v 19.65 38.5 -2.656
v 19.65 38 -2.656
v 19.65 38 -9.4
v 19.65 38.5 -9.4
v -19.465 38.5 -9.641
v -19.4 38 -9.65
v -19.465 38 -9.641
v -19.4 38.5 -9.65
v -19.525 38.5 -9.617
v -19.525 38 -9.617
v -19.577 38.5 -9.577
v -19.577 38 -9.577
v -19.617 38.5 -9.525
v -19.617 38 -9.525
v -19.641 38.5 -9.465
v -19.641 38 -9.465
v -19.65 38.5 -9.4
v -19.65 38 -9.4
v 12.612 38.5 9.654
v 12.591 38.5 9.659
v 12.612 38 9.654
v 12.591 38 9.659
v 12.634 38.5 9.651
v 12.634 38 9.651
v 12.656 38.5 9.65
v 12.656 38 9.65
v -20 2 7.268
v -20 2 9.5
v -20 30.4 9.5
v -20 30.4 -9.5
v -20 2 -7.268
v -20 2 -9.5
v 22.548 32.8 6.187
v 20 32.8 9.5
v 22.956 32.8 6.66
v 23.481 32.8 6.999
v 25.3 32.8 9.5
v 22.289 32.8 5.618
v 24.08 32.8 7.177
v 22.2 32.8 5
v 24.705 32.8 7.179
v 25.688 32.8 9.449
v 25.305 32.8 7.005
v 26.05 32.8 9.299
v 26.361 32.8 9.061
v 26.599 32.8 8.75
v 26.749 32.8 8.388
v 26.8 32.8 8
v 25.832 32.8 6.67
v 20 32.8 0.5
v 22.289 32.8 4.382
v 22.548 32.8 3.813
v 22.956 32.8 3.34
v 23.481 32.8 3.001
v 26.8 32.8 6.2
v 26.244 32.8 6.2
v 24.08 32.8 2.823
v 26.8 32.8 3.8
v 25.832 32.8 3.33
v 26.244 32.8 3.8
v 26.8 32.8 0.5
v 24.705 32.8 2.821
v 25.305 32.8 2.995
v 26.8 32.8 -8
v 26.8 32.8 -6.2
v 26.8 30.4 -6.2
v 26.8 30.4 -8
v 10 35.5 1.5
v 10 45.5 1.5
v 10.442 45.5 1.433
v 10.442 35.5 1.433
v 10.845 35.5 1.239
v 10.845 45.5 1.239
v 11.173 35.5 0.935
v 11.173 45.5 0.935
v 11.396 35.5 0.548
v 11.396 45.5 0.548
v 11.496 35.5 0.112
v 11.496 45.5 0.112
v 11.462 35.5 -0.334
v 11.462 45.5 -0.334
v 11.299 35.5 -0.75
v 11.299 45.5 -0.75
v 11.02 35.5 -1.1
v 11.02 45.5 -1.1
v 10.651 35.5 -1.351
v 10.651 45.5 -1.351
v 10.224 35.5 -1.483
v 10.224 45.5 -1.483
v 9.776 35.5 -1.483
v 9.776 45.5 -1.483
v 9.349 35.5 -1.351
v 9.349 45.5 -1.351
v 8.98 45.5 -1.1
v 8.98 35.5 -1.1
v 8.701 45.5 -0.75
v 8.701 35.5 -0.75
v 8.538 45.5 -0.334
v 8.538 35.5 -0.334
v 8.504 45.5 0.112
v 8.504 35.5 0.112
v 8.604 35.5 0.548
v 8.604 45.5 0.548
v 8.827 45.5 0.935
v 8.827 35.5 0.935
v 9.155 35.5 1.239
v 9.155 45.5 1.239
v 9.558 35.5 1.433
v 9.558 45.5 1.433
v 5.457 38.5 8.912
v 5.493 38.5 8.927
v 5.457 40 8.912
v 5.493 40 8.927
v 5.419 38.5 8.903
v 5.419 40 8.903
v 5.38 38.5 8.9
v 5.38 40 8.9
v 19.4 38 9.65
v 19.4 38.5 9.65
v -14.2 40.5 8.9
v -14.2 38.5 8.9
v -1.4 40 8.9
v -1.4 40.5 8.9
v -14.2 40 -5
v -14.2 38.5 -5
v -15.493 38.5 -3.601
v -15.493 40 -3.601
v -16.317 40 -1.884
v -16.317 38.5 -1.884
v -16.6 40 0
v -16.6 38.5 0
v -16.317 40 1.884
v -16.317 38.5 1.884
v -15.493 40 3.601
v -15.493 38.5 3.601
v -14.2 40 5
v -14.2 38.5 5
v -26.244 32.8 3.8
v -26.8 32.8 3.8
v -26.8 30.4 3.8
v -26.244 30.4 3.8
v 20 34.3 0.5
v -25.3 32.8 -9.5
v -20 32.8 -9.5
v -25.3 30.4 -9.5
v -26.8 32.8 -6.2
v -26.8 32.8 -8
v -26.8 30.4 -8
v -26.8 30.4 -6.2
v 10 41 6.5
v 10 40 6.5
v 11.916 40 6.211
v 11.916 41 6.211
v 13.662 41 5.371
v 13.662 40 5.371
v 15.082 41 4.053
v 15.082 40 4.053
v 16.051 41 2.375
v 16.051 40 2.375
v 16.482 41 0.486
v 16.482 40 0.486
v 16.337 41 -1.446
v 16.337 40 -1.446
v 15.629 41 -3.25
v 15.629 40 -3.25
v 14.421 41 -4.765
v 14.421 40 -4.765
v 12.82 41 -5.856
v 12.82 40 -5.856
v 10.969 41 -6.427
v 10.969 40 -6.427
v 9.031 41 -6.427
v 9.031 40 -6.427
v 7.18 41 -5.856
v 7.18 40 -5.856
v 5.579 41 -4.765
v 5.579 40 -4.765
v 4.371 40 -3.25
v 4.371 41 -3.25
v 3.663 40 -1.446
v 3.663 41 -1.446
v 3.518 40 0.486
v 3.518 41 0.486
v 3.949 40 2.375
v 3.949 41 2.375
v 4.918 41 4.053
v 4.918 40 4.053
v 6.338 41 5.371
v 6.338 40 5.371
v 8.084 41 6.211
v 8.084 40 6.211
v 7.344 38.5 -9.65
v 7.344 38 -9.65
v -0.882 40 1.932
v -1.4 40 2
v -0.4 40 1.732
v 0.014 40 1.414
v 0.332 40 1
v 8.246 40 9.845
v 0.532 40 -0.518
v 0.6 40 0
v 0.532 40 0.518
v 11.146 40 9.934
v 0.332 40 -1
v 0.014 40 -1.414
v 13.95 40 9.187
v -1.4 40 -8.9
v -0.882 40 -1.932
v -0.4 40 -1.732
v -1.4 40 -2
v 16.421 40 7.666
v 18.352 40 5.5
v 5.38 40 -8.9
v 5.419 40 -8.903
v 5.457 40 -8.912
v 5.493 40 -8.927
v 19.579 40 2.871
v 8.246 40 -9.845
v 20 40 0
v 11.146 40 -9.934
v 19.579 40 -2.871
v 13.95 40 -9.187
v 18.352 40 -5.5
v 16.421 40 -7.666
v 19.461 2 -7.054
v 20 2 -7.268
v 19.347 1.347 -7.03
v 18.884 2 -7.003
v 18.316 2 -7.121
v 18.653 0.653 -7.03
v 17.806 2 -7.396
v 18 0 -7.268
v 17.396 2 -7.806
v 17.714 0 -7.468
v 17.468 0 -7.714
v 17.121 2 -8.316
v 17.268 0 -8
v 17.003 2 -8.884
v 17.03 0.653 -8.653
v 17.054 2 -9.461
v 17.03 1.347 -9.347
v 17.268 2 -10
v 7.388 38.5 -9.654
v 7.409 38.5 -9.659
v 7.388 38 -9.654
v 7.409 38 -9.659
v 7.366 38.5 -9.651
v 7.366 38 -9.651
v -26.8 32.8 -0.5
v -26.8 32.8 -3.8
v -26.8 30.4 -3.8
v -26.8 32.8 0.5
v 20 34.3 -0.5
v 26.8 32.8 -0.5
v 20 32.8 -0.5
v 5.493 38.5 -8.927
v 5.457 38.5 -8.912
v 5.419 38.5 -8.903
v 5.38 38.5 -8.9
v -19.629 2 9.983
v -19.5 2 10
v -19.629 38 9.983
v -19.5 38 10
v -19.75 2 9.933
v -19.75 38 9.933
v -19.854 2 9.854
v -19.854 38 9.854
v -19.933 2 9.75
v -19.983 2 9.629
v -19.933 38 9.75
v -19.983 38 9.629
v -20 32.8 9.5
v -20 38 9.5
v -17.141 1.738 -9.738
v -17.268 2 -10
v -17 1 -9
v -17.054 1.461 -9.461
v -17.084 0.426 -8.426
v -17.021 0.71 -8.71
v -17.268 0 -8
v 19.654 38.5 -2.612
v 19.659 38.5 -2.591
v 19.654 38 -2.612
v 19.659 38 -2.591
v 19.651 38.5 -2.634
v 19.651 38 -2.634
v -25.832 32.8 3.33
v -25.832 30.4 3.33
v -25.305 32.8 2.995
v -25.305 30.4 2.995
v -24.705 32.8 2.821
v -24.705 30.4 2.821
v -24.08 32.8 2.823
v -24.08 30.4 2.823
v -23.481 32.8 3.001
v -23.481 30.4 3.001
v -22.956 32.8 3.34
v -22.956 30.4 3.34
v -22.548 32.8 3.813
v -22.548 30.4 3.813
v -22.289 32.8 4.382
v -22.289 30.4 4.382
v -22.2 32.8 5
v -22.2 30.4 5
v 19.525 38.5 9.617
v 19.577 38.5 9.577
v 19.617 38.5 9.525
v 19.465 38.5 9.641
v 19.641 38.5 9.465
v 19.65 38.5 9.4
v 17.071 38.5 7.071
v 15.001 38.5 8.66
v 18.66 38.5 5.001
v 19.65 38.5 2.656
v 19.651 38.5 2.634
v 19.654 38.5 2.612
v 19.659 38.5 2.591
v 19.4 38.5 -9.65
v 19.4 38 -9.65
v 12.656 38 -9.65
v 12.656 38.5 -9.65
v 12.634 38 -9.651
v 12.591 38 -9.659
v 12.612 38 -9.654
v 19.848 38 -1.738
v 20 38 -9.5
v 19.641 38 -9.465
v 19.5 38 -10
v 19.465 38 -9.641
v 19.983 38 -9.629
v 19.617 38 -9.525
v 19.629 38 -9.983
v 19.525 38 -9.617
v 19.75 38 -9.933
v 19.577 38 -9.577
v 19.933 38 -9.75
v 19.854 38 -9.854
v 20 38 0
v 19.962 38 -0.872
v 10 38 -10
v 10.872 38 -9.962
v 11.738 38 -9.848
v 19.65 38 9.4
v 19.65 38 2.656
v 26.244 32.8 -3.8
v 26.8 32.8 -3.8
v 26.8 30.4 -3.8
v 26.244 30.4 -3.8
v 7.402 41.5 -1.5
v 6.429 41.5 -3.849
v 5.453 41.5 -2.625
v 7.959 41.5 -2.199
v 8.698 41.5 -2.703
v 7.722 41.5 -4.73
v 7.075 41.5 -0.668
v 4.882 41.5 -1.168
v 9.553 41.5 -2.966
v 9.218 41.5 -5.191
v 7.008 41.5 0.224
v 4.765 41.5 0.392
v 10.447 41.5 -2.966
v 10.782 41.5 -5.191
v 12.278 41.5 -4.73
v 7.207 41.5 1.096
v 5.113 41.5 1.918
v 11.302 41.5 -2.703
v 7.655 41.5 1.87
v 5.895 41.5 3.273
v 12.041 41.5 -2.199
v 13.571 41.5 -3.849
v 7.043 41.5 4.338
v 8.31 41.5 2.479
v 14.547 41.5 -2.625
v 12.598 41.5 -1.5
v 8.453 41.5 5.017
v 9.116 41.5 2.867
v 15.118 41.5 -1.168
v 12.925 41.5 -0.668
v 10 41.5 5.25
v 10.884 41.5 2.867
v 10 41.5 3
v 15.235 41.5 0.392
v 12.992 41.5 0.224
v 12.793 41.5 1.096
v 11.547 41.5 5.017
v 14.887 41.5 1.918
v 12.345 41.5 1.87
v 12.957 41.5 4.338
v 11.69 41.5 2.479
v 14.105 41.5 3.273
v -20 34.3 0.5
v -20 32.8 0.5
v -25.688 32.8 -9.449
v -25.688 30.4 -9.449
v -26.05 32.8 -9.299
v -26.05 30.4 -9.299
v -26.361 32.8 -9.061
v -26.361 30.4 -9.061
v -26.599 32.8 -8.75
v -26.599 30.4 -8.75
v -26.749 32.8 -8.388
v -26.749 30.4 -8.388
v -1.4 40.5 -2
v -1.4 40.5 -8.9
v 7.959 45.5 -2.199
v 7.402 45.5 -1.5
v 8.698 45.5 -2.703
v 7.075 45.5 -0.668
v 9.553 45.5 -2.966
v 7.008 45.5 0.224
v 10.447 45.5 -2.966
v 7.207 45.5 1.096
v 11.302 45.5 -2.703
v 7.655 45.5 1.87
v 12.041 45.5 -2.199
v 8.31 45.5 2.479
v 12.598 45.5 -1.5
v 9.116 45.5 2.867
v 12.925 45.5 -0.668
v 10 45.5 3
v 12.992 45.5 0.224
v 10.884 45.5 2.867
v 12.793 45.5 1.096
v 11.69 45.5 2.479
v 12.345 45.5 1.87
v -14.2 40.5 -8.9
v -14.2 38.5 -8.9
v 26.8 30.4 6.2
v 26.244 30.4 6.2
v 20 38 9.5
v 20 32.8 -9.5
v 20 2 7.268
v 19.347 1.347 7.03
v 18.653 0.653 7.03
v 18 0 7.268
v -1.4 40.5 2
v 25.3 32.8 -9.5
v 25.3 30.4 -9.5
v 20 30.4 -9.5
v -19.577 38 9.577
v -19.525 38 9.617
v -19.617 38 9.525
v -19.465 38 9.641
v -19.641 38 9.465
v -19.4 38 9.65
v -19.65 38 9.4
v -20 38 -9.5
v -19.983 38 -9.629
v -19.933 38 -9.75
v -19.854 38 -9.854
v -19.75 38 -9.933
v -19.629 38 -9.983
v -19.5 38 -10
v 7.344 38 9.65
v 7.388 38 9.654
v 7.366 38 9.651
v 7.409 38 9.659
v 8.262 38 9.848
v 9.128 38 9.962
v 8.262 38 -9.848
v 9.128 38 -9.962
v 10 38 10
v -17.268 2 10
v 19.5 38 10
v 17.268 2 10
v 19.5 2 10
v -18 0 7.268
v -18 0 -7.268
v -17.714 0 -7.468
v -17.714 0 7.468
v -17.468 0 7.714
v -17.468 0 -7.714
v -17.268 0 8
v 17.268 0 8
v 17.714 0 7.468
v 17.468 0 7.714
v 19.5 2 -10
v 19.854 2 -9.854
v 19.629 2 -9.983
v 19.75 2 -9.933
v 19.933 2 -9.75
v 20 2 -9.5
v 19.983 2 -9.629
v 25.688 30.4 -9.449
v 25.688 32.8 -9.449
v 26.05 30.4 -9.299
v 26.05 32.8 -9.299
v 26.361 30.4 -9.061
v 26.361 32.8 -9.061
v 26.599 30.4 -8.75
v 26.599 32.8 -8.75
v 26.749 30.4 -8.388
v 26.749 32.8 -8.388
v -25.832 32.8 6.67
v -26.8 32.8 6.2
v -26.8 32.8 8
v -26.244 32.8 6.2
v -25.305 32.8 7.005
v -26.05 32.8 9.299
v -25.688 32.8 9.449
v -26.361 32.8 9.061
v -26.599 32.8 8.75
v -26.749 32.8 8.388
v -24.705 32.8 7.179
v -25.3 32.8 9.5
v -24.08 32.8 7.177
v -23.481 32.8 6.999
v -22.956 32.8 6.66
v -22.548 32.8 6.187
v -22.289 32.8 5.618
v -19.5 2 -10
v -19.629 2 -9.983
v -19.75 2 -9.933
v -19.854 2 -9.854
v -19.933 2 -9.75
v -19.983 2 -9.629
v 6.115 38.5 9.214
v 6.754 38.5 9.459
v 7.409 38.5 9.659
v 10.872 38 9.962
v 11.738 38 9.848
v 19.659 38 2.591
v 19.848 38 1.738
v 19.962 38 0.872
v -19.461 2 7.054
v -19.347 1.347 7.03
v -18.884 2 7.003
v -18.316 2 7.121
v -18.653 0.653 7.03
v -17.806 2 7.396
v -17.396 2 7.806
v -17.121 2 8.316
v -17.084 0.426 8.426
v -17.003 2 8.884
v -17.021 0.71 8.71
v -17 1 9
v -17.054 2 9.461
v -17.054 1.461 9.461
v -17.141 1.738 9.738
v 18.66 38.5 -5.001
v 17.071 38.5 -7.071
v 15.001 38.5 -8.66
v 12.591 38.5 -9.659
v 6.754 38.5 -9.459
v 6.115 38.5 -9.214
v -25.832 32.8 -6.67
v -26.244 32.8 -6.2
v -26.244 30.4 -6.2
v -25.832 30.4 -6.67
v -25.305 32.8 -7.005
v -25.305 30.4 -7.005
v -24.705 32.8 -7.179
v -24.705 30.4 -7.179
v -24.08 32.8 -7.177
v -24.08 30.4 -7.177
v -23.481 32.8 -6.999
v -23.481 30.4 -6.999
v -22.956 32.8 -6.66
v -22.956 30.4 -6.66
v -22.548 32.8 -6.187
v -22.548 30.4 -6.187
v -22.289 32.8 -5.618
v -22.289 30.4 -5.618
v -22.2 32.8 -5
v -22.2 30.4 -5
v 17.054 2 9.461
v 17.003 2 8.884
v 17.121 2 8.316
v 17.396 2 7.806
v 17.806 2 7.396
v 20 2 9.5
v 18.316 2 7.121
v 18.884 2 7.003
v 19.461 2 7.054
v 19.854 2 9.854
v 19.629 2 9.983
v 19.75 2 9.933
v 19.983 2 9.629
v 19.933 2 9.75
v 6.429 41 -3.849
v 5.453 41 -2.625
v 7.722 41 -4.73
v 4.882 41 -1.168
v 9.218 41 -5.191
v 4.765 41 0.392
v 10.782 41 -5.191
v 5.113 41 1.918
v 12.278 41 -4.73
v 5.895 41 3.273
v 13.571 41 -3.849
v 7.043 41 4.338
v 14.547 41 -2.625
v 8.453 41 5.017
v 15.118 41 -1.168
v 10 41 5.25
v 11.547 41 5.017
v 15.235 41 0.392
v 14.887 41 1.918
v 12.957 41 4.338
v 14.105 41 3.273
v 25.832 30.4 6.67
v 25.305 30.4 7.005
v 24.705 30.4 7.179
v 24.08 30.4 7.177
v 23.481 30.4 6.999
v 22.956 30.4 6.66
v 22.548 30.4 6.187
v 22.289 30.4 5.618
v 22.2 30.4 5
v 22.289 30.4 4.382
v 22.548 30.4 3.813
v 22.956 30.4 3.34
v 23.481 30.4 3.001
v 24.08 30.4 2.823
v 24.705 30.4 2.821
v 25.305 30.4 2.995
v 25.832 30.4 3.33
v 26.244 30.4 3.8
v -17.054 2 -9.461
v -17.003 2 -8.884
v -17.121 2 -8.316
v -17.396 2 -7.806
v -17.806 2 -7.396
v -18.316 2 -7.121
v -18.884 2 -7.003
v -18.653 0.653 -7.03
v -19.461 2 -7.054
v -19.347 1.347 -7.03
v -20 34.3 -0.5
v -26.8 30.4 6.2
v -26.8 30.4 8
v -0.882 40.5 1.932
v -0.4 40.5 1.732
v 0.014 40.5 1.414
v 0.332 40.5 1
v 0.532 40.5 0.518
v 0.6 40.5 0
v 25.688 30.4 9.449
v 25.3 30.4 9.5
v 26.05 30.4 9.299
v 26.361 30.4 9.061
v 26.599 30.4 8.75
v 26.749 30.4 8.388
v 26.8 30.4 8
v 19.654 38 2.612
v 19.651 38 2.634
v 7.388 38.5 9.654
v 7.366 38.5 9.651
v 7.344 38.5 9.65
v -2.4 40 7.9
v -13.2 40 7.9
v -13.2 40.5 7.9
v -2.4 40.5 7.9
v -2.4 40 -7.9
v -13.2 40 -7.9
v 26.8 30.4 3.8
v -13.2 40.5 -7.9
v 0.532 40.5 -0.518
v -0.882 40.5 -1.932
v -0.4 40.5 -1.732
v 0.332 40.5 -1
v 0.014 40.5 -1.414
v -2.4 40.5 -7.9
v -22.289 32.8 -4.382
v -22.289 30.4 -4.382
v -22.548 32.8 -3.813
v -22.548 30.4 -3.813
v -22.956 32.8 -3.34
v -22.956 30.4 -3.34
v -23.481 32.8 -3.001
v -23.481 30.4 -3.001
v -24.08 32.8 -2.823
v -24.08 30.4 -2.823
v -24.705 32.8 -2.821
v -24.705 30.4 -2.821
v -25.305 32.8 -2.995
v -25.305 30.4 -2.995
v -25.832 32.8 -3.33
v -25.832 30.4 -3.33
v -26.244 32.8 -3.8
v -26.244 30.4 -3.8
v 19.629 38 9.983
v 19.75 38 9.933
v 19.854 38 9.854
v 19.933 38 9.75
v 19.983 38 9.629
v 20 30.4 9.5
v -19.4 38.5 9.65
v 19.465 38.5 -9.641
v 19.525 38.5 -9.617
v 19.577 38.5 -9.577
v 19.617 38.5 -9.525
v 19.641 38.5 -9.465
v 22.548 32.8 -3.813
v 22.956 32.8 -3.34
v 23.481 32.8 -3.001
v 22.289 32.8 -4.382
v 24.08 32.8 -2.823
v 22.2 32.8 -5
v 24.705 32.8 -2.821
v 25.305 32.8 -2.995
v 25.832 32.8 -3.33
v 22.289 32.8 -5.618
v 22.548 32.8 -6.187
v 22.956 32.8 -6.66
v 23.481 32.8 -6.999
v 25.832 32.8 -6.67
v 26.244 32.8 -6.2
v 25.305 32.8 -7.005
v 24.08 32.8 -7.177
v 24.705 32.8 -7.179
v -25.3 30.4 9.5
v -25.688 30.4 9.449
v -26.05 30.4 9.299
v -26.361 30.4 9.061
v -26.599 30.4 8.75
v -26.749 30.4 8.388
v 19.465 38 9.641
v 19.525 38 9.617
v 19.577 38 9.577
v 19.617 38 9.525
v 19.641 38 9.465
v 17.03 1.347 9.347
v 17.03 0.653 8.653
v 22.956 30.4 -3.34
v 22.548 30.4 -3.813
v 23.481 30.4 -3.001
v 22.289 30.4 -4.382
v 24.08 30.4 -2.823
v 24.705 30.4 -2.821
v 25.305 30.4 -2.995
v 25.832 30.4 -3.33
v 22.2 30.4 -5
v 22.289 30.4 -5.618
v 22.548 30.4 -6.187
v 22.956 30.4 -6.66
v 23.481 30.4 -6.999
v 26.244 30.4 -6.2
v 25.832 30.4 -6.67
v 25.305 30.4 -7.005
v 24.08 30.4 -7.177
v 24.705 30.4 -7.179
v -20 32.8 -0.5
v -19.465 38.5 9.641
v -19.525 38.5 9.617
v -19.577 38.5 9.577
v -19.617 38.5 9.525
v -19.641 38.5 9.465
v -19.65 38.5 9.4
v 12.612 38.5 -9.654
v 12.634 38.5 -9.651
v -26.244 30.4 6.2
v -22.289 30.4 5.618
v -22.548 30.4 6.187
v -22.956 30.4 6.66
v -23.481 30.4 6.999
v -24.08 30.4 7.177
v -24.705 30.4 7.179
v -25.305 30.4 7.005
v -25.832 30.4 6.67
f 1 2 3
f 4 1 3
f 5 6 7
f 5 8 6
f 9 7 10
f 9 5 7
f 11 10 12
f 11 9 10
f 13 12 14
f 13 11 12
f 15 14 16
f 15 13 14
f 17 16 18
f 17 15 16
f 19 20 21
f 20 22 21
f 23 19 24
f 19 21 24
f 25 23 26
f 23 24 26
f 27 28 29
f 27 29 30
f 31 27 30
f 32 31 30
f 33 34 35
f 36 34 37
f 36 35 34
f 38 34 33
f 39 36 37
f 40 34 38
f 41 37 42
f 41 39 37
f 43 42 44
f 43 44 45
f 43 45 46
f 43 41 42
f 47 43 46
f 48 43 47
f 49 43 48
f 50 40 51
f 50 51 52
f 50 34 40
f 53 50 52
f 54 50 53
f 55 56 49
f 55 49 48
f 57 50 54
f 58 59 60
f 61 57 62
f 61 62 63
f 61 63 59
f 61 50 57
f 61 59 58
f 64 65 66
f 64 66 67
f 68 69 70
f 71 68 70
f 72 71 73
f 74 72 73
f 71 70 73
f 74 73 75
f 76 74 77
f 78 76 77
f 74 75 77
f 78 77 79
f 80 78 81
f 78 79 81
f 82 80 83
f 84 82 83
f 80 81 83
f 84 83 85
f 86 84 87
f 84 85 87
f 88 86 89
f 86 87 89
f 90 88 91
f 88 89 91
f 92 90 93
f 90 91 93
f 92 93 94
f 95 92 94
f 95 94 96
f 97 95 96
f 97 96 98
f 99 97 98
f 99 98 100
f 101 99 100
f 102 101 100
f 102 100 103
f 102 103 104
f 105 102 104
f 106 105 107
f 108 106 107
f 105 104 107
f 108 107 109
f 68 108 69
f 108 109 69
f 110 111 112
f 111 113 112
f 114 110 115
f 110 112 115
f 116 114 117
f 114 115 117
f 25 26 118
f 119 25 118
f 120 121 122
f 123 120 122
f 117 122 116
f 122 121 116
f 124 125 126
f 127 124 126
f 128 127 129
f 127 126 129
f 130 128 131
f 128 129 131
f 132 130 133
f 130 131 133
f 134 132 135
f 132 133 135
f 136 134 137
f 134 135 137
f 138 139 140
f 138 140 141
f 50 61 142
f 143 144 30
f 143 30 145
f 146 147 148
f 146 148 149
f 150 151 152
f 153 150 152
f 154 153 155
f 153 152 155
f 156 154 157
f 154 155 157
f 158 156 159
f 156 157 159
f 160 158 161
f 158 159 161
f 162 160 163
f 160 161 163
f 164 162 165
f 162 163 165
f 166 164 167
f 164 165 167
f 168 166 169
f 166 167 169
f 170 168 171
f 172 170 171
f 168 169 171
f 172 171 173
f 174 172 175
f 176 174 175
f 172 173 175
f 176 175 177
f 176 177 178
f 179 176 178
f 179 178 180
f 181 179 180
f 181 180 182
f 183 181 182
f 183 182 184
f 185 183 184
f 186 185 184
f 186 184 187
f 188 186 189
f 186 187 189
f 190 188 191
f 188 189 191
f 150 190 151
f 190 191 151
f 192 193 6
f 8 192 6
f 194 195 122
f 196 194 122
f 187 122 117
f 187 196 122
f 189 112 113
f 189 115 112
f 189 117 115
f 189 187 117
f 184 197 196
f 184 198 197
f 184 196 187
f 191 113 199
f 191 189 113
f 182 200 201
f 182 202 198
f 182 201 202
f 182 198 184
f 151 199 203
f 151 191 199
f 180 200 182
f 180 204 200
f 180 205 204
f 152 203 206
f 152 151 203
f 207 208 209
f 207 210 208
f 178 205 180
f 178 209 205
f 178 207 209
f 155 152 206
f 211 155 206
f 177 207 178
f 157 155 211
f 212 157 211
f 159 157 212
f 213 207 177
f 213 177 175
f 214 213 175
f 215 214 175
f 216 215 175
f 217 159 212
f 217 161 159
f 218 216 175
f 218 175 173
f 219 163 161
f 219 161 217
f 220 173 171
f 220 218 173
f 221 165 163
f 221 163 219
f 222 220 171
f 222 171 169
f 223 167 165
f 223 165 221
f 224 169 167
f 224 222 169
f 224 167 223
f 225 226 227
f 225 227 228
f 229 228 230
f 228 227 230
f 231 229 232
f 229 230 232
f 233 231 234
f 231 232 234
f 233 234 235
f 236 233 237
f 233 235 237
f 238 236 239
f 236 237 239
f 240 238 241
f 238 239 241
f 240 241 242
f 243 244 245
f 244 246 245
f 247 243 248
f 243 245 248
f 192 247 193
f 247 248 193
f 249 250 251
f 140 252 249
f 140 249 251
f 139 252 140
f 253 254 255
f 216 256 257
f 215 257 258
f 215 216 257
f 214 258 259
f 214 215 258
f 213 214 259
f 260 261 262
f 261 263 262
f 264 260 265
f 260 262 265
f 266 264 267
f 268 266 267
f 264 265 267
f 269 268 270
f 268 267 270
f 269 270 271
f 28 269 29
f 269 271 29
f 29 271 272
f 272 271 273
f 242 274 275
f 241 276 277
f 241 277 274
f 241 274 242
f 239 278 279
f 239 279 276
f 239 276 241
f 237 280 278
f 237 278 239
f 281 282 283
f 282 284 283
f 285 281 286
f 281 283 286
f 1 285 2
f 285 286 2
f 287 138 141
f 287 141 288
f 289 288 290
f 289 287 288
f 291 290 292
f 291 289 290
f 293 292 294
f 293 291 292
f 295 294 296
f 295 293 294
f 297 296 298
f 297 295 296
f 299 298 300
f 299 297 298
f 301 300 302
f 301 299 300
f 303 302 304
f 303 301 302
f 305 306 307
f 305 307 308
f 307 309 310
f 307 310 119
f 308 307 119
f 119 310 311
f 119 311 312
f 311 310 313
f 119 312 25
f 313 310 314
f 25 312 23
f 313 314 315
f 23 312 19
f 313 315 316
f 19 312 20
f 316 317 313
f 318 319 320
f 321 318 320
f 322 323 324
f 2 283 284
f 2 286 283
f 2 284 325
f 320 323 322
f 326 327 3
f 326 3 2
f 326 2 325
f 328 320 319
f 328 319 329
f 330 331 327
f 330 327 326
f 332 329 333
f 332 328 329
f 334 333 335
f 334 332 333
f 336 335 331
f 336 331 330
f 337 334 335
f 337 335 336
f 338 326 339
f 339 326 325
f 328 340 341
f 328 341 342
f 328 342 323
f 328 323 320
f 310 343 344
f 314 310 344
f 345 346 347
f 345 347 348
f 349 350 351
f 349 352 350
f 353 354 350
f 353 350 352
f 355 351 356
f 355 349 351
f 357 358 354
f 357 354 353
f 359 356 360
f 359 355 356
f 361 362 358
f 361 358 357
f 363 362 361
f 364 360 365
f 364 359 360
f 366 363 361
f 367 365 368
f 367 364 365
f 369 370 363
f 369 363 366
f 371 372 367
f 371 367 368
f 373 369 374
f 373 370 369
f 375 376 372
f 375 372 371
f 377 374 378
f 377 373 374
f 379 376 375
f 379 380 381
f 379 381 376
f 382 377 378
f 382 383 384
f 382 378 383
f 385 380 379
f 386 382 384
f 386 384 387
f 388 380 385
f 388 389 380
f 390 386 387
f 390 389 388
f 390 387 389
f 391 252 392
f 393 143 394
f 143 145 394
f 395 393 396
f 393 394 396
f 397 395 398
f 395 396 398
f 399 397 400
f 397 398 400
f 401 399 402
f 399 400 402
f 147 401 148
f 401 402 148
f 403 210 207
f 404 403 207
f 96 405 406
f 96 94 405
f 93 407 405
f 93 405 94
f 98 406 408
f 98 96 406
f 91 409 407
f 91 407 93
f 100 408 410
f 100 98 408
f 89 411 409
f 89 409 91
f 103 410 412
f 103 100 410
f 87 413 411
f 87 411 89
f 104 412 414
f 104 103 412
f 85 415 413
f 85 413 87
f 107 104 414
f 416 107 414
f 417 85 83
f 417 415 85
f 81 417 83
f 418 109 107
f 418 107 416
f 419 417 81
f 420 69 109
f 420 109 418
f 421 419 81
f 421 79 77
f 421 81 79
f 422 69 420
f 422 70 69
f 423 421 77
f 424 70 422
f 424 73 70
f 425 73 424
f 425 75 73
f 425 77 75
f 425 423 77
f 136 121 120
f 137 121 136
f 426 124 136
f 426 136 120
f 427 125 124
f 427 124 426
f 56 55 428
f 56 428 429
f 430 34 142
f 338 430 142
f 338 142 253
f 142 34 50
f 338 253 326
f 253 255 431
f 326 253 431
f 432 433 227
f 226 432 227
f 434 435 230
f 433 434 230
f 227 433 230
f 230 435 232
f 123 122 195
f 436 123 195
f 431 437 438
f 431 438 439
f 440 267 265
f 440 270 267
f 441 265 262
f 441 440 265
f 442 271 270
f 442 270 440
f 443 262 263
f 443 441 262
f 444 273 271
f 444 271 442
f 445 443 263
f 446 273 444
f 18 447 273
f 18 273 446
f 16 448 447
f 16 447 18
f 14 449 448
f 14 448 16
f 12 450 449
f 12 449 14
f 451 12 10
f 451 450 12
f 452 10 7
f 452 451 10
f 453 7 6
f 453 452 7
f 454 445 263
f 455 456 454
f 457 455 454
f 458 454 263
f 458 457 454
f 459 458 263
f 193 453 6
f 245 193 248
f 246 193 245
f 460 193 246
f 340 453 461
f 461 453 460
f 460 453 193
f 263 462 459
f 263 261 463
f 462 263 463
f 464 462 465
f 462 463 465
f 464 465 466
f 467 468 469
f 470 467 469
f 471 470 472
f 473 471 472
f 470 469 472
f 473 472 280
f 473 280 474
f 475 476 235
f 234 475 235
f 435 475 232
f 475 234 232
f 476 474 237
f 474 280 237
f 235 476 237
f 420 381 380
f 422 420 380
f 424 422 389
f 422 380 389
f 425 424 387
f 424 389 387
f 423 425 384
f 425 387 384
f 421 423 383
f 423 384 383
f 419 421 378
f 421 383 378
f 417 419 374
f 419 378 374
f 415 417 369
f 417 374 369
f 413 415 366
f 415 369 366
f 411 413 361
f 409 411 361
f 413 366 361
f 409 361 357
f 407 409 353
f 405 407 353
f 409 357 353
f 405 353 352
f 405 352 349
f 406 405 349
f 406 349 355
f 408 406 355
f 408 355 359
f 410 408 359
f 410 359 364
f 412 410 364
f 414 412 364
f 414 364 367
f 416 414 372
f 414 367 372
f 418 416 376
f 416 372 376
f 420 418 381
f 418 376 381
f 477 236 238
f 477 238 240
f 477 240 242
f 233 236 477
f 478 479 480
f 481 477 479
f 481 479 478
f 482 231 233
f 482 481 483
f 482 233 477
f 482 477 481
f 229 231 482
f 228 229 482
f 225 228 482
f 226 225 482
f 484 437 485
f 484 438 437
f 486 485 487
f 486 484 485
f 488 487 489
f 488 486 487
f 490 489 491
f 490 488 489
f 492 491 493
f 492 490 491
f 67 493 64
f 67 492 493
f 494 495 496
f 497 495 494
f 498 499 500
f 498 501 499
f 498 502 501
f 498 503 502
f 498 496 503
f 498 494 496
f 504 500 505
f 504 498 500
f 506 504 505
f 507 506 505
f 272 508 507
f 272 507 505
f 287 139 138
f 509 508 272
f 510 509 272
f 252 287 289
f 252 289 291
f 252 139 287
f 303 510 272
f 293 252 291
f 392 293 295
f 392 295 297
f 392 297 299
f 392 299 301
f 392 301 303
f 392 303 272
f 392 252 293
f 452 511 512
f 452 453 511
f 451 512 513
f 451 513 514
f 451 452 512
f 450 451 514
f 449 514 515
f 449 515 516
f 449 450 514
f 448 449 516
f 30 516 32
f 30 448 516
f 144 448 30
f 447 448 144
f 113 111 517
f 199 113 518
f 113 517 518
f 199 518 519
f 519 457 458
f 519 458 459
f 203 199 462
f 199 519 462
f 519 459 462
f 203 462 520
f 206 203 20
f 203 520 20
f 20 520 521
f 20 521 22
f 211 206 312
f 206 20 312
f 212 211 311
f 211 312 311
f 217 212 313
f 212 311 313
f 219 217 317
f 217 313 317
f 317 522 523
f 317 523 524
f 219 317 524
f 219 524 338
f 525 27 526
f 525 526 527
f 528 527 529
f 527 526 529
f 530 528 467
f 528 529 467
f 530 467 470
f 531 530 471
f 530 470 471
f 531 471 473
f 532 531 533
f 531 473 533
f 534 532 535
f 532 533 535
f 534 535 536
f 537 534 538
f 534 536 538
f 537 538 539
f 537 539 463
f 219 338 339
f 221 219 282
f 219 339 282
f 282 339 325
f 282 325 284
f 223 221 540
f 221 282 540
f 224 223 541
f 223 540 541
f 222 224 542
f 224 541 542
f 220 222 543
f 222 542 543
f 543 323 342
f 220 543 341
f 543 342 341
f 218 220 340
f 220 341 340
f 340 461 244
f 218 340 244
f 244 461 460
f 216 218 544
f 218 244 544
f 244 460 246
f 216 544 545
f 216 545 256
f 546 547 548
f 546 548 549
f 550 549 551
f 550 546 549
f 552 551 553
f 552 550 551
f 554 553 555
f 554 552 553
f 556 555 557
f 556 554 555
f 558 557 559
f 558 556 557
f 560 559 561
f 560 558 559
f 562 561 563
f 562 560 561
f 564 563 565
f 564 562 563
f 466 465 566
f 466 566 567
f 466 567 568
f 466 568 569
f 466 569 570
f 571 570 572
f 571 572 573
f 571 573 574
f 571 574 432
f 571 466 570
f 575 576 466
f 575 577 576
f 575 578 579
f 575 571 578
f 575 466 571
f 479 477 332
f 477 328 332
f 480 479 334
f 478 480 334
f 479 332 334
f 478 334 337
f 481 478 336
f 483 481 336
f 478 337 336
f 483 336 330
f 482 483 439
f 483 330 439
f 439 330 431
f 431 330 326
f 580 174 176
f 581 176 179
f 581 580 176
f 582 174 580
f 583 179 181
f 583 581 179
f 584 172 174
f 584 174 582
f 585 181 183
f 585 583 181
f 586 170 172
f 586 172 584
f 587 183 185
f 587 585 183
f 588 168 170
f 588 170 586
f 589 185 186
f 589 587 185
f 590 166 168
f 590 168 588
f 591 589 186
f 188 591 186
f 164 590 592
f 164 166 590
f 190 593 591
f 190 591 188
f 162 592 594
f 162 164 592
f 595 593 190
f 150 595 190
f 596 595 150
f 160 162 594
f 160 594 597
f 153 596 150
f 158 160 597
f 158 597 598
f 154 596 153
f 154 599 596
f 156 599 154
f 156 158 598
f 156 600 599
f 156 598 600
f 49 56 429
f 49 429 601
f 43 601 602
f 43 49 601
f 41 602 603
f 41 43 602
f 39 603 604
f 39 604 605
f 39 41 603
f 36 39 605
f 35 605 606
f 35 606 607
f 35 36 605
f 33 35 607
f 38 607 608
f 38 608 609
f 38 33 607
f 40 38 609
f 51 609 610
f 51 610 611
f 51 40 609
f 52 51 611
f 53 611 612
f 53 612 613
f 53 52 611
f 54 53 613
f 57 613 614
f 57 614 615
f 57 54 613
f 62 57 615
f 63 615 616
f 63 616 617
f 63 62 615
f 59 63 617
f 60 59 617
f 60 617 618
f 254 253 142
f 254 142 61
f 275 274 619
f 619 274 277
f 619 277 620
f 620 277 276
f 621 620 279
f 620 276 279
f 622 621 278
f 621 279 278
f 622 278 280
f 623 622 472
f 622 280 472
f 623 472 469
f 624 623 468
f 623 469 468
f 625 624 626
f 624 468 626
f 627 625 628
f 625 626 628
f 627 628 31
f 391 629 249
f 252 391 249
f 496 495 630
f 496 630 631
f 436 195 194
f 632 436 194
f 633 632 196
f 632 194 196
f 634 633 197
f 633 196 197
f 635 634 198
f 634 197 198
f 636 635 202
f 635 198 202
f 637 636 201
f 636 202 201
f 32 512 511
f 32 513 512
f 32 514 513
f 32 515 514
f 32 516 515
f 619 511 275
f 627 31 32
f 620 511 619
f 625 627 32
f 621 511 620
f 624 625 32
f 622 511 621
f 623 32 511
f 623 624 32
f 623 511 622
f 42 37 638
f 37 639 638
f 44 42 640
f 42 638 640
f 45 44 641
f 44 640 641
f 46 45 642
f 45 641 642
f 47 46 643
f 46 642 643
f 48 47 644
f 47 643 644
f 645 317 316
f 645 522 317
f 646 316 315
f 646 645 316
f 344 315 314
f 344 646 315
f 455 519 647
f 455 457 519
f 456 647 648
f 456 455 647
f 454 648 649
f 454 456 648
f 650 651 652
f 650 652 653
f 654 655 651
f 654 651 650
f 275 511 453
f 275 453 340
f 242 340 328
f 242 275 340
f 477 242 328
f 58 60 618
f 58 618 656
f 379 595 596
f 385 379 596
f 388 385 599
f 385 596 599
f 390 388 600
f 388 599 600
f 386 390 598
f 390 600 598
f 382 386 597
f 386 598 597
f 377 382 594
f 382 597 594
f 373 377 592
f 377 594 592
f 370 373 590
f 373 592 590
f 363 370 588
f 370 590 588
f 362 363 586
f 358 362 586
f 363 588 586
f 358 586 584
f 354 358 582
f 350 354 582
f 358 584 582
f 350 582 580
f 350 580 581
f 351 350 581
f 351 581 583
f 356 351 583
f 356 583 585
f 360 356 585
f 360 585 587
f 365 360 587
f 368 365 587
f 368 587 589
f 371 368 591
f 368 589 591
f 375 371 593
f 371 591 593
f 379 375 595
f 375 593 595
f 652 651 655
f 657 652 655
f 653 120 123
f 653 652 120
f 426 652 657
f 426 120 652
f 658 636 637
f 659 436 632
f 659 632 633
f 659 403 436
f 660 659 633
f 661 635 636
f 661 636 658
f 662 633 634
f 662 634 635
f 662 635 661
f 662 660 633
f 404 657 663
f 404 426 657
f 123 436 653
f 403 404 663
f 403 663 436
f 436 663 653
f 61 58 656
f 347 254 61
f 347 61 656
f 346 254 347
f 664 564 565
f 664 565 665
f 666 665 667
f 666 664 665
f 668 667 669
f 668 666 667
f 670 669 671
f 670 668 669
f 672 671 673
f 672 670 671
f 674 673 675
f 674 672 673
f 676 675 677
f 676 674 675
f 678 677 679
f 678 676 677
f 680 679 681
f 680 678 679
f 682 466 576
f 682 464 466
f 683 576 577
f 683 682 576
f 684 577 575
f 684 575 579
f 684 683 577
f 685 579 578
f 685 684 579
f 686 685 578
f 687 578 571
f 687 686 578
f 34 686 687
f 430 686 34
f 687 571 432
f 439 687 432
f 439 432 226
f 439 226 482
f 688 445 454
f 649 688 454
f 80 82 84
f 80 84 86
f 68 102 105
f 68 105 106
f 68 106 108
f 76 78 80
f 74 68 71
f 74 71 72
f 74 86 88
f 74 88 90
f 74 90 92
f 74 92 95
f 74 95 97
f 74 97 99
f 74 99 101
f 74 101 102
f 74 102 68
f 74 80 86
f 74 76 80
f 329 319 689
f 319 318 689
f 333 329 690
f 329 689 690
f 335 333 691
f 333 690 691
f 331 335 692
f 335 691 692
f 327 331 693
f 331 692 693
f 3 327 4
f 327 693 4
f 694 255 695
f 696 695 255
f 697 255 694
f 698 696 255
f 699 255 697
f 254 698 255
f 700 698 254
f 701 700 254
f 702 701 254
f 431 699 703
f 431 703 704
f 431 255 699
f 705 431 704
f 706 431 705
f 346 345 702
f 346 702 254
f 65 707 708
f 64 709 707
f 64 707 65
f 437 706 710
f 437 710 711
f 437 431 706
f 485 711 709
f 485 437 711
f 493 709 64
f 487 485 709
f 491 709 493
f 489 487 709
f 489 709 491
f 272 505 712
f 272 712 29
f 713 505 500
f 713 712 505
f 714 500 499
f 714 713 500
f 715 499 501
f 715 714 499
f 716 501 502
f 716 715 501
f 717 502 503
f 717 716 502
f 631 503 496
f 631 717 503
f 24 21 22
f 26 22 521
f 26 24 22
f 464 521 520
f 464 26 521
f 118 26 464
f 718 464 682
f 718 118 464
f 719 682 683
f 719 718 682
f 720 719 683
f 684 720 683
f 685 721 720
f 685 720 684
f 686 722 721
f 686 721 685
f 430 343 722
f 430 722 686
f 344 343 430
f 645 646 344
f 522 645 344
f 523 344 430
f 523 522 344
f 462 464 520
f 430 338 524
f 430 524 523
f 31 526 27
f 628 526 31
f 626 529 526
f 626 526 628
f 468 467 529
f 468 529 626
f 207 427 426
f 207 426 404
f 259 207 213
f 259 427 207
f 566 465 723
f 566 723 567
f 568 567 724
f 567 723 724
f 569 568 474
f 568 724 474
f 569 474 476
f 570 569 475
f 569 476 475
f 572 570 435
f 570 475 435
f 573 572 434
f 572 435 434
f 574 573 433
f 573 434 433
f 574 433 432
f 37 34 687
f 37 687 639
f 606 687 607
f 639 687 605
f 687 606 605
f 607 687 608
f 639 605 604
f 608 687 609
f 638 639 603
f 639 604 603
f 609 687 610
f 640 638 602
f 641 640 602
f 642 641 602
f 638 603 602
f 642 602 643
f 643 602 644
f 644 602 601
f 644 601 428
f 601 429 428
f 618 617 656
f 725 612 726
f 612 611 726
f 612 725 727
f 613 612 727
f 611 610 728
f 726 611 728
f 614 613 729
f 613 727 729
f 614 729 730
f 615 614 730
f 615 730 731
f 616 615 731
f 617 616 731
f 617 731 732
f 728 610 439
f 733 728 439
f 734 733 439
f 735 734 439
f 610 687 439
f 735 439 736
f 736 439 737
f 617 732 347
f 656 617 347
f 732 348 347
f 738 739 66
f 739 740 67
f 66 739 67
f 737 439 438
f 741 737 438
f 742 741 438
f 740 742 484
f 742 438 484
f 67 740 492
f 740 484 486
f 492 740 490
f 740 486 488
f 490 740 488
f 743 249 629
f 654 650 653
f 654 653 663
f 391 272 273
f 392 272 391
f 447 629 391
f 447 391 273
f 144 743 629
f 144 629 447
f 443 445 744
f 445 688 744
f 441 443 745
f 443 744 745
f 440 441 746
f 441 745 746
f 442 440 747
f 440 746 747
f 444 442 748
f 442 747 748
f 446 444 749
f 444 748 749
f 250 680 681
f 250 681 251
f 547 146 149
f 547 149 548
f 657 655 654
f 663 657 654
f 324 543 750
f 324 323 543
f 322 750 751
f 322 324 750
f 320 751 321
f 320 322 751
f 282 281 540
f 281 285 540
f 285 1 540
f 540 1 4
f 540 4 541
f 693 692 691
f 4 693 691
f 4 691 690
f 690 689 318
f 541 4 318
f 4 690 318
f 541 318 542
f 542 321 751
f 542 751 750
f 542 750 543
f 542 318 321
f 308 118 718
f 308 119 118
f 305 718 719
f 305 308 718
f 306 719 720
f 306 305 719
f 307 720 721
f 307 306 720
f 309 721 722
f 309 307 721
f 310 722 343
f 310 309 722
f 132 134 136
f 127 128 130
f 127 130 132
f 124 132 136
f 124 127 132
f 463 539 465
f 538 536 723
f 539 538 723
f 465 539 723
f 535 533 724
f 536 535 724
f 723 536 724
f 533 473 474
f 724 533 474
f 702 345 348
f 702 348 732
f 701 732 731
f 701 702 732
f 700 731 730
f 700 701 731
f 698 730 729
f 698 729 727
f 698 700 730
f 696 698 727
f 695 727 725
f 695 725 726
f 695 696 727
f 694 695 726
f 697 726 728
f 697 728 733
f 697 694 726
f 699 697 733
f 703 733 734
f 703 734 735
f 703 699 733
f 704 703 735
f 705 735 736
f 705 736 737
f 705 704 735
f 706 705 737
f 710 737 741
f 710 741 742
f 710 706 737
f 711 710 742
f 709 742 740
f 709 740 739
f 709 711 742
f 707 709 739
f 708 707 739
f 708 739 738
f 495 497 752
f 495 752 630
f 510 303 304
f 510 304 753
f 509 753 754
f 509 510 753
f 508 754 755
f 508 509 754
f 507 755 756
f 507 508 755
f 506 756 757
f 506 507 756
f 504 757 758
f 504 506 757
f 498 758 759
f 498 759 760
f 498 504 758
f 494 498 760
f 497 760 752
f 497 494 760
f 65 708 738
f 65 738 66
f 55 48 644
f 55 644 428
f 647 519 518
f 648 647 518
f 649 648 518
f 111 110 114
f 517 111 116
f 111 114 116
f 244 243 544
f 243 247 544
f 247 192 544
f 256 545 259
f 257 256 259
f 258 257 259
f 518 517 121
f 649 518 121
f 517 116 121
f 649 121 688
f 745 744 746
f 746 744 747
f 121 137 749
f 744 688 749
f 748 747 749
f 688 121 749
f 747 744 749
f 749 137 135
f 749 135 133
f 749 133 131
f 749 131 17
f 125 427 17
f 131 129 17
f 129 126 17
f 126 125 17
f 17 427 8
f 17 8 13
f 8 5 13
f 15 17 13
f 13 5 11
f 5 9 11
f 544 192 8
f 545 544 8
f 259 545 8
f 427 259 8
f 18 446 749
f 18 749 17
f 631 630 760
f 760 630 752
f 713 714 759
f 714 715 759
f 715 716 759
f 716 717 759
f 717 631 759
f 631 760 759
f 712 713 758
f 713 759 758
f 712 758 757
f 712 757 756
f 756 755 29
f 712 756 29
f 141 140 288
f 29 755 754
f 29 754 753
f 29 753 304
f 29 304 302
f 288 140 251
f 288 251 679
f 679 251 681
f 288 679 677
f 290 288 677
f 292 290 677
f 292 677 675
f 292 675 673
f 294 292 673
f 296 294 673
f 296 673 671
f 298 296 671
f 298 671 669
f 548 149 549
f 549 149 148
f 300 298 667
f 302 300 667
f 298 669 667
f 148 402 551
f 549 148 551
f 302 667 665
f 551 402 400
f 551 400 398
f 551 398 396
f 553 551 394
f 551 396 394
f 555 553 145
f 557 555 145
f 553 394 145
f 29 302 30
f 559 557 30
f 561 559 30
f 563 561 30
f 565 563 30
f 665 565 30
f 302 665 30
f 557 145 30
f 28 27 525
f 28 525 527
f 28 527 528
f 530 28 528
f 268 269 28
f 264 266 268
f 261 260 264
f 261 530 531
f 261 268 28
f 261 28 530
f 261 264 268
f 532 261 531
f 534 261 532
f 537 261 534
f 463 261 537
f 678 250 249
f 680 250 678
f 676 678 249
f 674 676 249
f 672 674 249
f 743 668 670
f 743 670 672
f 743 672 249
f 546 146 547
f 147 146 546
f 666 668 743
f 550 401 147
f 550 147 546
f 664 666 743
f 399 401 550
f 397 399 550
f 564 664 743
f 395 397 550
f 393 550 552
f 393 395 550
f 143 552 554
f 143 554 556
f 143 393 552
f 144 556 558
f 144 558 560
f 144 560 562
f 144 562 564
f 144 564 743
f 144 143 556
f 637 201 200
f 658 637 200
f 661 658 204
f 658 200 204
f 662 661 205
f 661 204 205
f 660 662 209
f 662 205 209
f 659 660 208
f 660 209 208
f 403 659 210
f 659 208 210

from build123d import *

# Parameters (mm, degrees)
SKETCH1_W                 = 40
SKETCH1_H                 = 20
BOSS_EXTRUDE1_DEPTH       = 38
BOSS_EXTRUDE2_DEPTH       = 2
BOSS_EXTRUDE3_DEPTH       = 0.5
SKETCH6_W                 = 12.8
SKETCH6_H                 = 17.8
SKETCH6_W_2               = 10.8
SKETCH6_H_2               = 15.8
BOSS_EXTRUDE4_DEPTH       = 0.5
BOSS_EXTRUDE5_DEPTH       = 0.5
SKETCH8_R                 = 6.5
BOSS_EXTRUDE6_DEPTH       = 1
SKETCH9_R                 = 5.25
BOSS_EXTRUDE7_DEPTH       = 0.5
SKETCH10_R                = 3
BOSS_EXTRUDE8_DEPTH       = 4
SKETCH11_R                = 1.5
CUT_EXTRUDE1_DEPTH        = 10
CHAMFER1_SIZE             = 2
SKETCH12_R                = 2
CUT_EXTRUDE2_DEPTH        = 2
FILLET1_R                 = 0.5
FILLET2_R                 = 0.25
BOSS_EXTRUDE9_DEPTH       = 2.4
BOSS_EXTRUDE10_DEPTH      = 0.5
BOSS_EXTRUDE10_DEPTH_BACK = 0.5
FILLET3_R                 = 1.5


with BuildPart() as part:
    # Sketch1 → Boss-Extrude1 (new body)
    with BuildSketch(Plane(origin=(0, 0, 0), x_dir=(1, 0, 0), z_dir=(0, 1, 0))):
        Rectangle(SKETCH1_W, SKETCH1_H)
    extrude(amount=BOSS_EXTRUDE1_DEPTH)

    # Sketch2 → Boss-Extrude2 (add)
    with BuildSketch(Plane(origin=(0, 38, 0), x_dir=(1, 0, 0), z_dir=(0, 1, 0))):
        with BuildLine():
            ThreePointArc((-3.783333333, 0), (-7.418581742, 5.77726026), (-14.2, 5))
            Line((-14.2, 5), (-14.2, -5))
            ThreePointArc((-14.2, -5), (-7.418581742, -5.77726026), (-3.783333333, 0))
        make_face()
        with BuildLine():
            Line((-14.2, -5), (-14.2, 5))
            ThreePointArc((-14.2, 5), (-16.6, 0), (-14.2, -5))
        make_face()
        with BuildLine():
            Line((5.440394754, 8.9), (-14.2, 8.9))
            Line((-14.2, 8.9), (-14.2, 5))
            ThreePointArc((-14.2, 5), (-7.418581742, 5.77726026), (-3.783333333, 0))
            ThreePointArc((-3.783333333, 0), (-7.418581742, -5.77726026), (-14.2, -5))
            Line((-14.2, -5), (-14.2, -8.9))
            Line((-14.2, -8.9), (5.440394754, -8.9))
            ThreePointArc((5.440394754, -8.9), (0, 0), (5.440394754, 8.9))
        make_face()
        with BuildLine():
            ThreePointArc((20, 0), (15.215551147, 8.532175938), (5.440394754, 8.9))
            Line((5.440394754, 8.9), (5.440394754, -8.9))
            ThreePointArc((5.440394754, -8.9), (15.215551147, -8.532175938), (20, 0))
        make_face()
        with BuildLine():
            Line((5.440394754, -8.9), (5.440394754, 8.9))
            ThreePointArc((5.440394754, 8.9), (0, 0), (5.440394754, -8.9))
        make_face()
    extrude(amount=BOSS_EXTRUDE2_DEPTH)

    # Sketch3 → Boss-Extrude3 (add)
    with BuildSketch(Plane(origin=(0, 38, 0), x_dir=(1, 0, 0), z_dir=(0, 1, 0))):
        Polygon((-19.65, 9.65), (10, 9.65), (19.65, 9.65), (19.65, 0), (19.65, -9.65), (10, -9.65), (-19.65, -9.65), align=None)
    extrude(amount=BOSS_EXTRUDE3_DEPTH)

    # Sketch6 → Boss-Extrude4 (add)
    with BuildSketch(Plane(origin=(0, 40, 0), x_dir=(1, 0, 0), z_dir=(0, 1, 0))):
        with Locations((-7.8, 0)):
            Rectangle(SKETCH6_W, SKETCH6_H)
        with Locations((-7.8, 0)):
            Rectangle(SKETCH6_W_2, SKETCH6_H_2, mode=Mode.SUBTRACT)
    extrude(amount=BOSS_EXTRUDE4_DEPTH)

    # Sketch7 → Boss-Extrude5 (add)
    with BuildSketch(Plane(origin=(0, 40, 0), x_dir=(1, 0, 0), z_dir=(0, 1, 0))):
        with BuildLine():
            ThreePointArc((0.6, 0), (0.014213562, 1.414213562), (-1.4, 2))
            Line((-1.4, 2), (-1.4, -2))
            ThreePointArc((-1.4, -2), (0.014213562, -1.414213562), (0.6, 0))
        make_face()
    extrude(amount=BOSS_EXTRUDE5_DEPTH)

    # Sketch8 → Boss-Extrude6 (add)
    with BuildSketch(Plane(origin=(0, 40, 0), x_dir=(1, 0, 0), z_dir=(0, 1, 0))):
        with Locations(Location((10, 0, 0), (0, 0, 270))):
            Circle(SKETCH8_R)
    extrude(amount=BOSS_EXTRUDE6_DEPTH)

    # Sketch9 → Boss-Extrude7 (add)
    with BuildSketch(Plane(origin=(0, 41, 0), x_dir=(1, 0, 0), z_dir=(0, 1, 0))):
        with Locations(Location((10, 0, 0), (0, 0, 270))):
            Circle(SKETCH9_R)
    extrude(amount=BOSS_EXTRUDE7_DEPTH)

    # Sketch10 → Boss-Extrude8 (add)
    with BuildSketch(Plane(origin=(0, 41.5, 0), x_dir=(1, 0, 0), z_dir=(0, 1, 0))):
        with Locations(Location((10, 0, 0), (0, 0, 270))):
            Circle(SKETCH10_R)
    extrude(amount=BOSS_EXTRUDE8_DEPTH)

    # Sketch11 → Cut-Extrude1 (cut)
    with BuildSketch(Plane(origin=(0, 45.5, 0), x_dir=(1, 0, 0), z_dir=(0, 1, 0))):
        with Locations(Location((10, 0, 0), (0, 0, 270))):
            Circle(SKETCH11_R)
    extrude(amount=-CUT_EXTRUDE1_DEPTH, mode=Mode.SUBTRACT)

    # Chamfer1
    chamfer1_edges = [part.edges().sort_by_distance(p)[0] for p in [
        (-20, 0, 0),
        (0, 0, 10),
        (20, 0, 0),
        (0, 0, -10),
    ]]
    chamfer(chamfer1_edges, length=CHAMFER1_SIZE)

    # Sketch12 → Cut-Extrude2 (cut)
    with BuildSketch(Plane.XZ):
        with Locations((19, 9)):
            Circle(SKETCH12_R)
        with Locations((-19, 9)):
            Circle(SKETCH12_R)
        with Locations((19, -9)):
            Circle(SKETCH12_R)
        with Locations((-19, -9)):
            Circle(SKETCH12_R)
    extrude(amount=-CUT_EXTRUDE2_DEPTH, mode=Mode.SUBTRACT)

    # Fillet1
    fillet1_edges = [part.edges().sort_by_distance(p)[0] for p in [
        (-20, 20, -10),
        (-20, 20, 10),
        (20, 20, 10),
        (20, 20, -10),
    ]]
    fillet(fillet1_edges, radius=FILLET1_R)

    # Fillet2
    fillet2_edges = [part.edges().sort_by_distance(p)[0] for p in [
        (5.440394754, 39.25, 8.9),
        (5.440394754, 39.25, -8.9),
        (7.377501192, 38.25, 9.65),
        (7.377501192, 38.25, -9.65),
        (12.622498808, 38.25, -9.65),
        (19.65, 38.25, -2.622498808),
        (19.65, 38.25, 2.622498808),
        (12.622498808, 38.25, 9.65),
        (-19.65, 38.25, 9.65),
        (19.65, 38.25, 9.65),
        (19.65, 38.25, -9.65),
        (-19.65, 38.25, -9.65),
    ]]
    fillet(fillet2_edges, radius=FILLET2_R)

    # Sketch13 → Boss-Extrude9 (add)
    with BuildSketch(Plane(origin=(0, 32.8, 0), x_dir=(1, 0, 0), z_dir=(0, 1, 0))):
        with BuildLine():
            Line((-20, -9.5), (-20, 9.5))
            Line((-20, 9.5), (-26.8, 9.5))
            Line((-26.8, 9.5), (-26.8, 6.2))
            Line((-26.8, 6.2), (-26.243908891, 6.2))
            ThreePointArc((-26.243908891, 6.2), (-23.774140416, 7.109099282), (-22.2, 5))
            ThreePointArc((-22.2, 5), (-23.774140416, 2.890900718), (-26.243908891, 3.8))
            Line((-26.243908891, 3.8), (-26.8, 3.8))
            Line((-26.8, 3.8), (-26.8, -3.8))
            Line((-26.8, -3.8), (-26.243908891, -3.8))
            ThreePointArc((-26.243908891, -3.8), (-23.774140416, -2.890900718), (-22.2, -5))
            ThreePointArc((-22.2, -5), (-23.774140416, -7.109099282), (-26.243908891, -6.2))
            Line((-26.243908891, -6.2), (-26.8, -6.2))
            Line((-26.8, -6.2), (-26.8, -9.5))
            Line((-26.8, -9.5), (-20, -9.5))
        make_face()
        with BuildLine():
            Line((26.243908891, 6.2), (26.8, 6.2))
            Line((26.8, 6.2), (26.8, 9.5))
            Line((26.8, 9.5), (20, 9.5))
            Line((20, 9.5), (20, -9.5))
            Line((20, -9.5), (26.8, -9.5))
            Line((26.8, -9.5), (26.8, -6.2))
            Line((26.8, -6.2), (26.243908891, -6.2))
            ThreePointArc((26.243908891, -6.2), (22.2, -5), (26.243908891, -3.8))
            Line((26.243908891, -3.8), (26.8, -3.8))
            Line((26.8, -3.8), (26.8, 3.8))
            Line((26.8, 3.8), (26.243908891, 3.8))
            ThreePointArc((26.243908891, 3.8), (22.2, 5), (26.243908891, 6.2))
        make_face()
    extrude(amount=-BOSS_EXTRUDE9_DEPTH)

    # Sketch14 → Boss-Extrude10 (add, two sides: drawn at the far end of the back side and taken through both)
    with BuildSketch(Plane.XY.offset(-BOSS_EXTRUDE10_DEPTH_BACK)):
        Polygon((-26.8, 32.8), (-20, 32.8), (-20, 34.3), align=None)
        Polygon((20, 32.8), (20, 34.3), (26.8, 32.8), align=None)
    extrude(amount=BOSS_EXTRUDE10_DEPTH + BOSS_EXTRUDE10_DEPTH_BACK)

    # Fillet3
    fillet3_edges = [part.edges().sort_by_distance(p)[0] for p in [
        (-26.8, 31.6, -9.5),
        (-26.8, 31.6, 9.5),
        (26.8, 31.6, 9.5),
        (26.8, 31.6, -9.5),
    ]]
    fillet(fillet3_edges, radius=FILLET3_R)


solid = part.part
